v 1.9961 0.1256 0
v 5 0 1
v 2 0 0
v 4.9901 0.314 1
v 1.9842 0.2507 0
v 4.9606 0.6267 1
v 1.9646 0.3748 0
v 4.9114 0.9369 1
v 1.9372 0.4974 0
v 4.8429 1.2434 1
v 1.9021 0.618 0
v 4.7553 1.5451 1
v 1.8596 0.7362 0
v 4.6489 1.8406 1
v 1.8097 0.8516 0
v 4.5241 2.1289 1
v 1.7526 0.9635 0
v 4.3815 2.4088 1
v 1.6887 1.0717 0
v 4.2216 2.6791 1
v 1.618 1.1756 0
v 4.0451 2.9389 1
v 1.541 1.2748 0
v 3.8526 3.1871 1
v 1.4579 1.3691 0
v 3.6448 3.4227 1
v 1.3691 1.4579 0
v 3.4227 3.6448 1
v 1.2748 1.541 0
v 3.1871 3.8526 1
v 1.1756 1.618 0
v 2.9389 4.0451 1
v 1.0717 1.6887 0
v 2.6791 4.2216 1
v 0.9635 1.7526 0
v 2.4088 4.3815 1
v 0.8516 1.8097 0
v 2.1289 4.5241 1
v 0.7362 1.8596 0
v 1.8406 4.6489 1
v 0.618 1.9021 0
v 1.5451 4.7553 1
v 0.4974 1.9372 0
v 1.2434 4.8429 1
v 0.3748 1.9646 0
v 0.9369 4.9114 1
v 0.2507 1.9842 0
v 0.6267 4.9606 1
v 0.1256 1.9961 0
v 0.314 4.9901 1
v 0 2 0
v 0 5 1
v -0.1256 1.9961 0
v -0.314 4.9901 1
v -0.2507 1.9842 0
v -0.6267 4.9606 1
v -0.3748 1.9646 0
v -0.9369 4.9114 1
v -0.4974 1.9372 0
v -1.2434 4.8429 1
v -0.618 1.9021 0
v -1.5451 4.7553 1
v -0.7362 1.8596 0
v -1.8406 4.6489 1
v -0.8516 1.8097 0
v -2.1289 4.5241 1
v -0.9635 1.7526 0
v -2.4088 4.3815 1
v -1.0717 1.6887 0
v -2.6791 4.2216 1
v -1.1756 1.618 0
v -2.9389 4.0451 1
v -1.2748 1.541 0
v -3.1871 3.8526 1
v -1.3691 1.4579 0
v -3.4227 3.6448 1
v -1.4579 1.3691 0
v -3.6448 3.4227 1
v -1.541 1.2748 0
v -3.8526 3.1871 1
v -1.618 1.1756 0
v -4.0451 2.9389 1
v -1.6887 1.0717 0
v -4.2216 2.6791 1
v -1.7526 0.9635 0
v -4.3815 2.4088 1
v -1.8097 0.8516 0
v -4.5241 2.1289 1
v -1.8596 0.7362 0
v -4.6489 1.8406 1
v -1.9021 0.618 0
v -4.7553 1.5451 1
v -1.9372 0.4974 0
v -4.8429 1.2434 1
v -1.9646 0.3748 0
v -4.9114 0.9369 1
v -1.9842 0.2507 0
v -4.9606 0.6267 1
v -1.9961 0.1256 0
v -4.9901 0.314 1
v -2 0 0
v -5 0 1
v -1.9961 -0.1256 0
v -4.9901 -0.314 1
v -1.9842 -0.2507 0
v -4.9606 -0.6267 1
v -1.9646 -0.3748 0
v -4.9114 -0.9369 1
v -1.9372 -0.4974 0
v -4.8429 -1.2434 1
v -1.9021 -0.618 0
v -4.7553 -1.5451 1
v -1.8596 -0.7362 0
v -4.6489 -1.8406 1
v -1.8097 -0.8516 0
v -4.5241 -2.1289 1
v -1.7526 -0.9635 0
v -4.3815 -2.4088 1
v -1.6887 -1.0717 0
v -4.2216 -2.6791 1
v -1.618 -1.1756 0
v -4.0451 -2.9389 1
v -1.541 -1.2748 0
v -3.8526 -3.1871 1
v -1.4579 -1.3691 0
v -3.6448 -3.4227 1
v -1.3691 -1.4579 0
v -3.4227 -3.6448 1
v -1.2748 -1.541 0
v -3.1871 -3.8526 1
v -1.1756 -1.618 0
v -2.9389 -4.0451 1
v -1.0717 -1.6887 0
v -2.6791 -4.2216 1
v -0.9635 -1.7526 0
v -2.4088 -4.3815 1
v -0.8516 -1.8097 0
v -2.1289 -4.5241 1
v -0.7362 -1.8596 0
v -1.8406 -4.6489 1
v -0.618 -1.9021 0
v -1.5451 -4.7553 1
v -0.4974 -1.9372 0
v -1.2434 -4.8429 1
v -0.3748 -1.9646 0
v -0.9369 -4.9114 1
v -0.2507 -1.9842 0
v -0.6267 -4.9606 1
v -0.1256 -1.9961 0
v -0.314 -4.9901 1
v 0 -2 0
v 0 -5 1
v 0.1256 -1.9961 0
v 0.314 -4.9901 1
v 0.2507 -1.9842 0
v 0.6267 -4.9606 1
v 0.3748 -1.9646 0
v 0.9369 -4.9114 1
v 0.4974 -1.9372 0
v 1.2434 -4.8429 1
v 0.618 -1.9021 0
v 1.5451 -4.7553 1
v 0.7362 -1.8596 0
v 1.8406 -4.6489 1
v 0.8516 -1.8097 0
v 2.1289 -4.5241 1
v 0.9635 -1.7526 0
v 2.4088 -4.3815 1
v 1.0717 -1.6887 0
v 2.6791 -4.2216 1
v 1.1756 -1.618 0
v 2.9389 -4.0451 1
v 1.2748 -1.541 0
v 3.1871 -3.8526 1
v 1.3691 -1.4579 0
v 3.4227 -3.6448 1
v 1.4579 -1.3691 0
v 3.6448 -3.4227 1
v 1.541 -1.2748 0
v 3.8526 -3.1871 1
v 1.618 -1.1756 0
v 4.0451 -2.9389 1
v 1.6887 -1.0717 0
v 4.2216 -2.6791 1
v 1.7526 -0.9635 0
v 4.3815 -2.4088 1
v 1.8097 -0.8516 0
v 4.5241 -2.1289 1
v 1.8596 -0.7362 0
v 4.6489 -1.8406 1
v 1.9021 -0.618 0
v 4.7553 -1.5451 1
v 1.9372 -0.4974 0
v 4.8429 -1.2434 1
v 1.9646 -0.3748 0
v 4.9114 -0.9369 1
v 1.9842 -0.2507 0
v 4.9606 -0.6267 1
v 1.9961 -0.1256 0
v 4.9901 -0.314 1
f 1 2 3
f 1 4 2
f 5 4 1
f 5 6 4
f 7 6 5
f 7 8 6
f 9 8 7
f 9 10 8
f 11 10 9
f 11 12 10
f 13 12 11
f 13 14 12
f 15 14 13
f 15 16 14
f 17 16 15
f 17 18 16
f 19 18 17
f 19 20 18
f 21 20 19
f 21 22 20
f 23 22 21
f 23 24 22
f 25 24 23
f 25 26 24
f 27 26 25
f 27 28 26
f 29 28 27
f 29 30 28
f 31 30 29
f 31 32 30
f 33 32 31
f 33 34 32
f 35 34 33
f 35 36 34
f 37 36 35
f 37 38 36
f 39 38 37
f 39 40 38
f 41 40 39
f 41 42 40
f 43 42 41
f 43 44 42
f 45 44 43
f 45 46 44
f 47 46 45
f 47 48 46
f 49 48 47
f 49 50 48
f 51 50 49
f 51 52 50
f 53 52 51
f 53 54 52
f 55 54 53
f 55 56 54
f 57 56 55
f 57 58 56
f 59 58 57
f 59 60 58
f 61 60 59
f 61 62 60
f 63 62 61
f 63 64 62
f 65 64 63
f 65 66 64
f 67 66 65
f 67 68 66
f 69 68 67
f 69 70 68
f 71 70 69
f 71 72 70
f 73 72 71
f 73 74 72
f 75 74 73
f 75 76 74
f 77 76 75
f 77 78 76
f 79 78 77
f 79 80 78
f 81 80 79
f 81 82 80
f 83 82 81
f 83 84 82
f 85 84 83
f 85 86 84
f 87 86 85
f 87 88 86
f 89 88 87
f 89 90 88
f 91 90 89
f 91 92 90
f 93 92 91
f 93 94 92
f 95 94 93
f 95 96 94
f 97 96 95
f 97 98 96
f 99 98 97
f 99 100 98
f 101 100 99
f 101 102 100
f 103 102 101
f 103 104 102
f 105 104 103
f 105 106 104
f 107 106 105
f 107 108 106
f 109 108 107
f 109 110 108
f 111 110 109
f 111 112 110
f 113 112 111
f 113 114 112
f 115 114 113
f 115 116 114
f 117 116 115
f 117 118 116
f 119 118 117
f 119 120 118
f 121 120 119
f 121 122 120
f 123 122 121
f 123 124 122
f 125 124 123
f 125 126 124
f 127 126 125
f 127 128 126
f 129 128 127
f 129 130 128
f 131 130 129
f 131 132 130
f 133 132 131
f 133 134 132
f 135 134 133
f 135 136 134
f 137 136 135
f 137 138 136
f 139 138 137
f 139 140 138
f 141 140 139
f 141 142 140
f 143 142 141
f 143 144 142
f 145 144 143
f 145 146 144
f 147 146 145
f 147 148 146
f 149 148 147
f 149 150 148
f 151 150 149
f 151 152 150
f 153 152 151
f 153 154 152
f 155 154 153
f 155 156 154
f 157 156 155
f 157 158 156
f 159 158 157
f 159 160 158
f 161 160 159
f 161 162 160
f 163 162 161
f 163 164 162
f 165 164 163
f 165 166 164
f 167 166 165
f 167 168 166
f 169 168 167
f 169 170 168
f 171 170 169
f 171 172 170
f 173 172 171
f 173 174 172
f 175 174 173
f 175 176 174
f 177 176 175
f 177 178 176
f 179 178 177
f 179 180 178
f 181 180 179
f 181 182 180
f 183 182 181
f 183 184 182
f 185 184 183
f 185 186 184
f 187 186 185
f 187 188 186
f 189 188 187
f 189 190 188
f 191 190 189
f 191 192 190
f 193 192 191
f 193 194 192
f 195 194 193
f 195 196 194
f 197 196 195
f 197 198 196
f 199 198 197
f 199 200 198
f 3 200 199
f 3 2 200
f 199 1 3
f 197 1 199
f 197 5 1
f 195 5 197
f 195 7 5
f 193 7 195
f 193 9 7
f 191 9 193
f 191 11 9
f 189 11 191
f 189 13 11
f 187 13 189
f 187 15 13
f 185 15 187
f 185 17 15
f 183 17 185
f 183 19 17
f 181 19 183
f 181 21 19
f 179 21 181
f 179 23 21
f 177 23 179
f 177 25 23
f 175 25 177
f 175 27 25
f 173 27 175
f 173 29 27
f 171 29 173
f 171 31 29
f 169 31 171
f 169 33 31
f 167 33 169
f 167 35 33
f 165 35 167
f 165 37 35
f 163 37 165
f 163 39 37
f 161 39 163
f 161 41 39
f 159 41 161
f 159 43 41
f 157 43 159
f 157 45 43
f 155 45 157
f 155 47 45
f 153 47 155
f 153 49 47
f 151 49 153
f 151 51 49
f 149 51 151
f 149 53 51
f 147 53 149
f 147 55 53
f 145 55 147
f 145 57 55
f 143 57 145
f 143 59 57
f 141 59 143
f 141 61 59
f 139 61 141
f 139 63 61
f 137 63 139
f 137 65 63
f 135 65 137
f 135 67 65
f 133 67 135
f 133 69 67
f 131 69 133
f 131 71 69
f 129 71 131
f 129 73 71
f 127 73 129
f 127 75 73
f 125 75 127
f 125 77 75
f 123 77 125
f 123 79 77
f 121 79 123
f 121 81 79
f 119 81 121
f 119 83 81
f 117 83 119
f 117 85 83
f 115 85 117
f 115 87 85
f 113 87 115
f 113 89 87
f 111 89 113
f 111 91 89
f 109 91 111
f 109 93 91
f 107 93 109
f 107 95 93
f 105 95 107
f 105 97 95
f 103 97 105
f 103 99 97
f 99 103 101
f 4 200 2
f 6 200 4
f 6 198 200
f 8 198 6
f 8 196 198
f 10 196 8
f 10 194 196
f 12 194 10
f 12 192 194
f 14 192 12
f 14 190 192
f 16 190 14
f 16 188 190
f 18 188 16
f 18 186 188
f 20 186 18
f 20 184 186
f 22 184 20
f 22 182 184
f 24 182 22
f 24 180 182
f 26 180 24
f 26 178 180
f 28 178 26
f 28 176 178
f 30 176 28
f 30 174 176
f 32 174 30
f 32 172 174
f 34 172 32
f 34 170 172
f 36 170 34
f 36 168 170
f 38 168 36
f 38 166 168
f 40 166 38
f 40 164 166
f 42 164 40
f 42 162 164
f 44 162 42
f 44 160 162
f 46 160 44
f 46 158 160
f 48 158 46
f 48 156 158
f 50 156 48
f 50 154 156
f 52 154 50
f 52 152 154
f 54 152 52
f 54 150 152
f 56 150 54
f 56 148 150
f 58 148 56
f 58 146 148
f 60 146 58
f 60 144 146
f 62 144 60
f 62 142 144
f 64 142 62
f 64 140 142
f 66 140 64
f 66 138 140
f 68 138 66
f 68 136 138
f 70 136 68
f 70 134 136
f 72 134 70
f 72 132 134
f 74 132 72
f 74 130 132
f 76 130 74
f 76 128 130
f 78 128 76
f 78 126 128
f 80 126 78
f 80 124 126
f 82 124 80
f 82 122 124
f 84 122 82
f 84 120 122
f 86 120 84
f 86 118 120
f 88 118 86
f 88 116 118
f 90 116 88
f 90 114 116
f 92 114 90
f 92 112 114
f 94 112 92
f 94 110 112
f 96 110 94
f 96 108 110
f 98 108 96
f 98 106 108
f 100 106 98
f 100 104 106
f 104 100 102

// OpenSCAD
// Generated by Mecha (https://github.com/tomahawkins/mecha)

color([0.5, 0.5, 0.5, 1.0]) cylinder(h = 1.0, r1 = 2.0, r2 = 5.0, center = false, $fn = 100);
